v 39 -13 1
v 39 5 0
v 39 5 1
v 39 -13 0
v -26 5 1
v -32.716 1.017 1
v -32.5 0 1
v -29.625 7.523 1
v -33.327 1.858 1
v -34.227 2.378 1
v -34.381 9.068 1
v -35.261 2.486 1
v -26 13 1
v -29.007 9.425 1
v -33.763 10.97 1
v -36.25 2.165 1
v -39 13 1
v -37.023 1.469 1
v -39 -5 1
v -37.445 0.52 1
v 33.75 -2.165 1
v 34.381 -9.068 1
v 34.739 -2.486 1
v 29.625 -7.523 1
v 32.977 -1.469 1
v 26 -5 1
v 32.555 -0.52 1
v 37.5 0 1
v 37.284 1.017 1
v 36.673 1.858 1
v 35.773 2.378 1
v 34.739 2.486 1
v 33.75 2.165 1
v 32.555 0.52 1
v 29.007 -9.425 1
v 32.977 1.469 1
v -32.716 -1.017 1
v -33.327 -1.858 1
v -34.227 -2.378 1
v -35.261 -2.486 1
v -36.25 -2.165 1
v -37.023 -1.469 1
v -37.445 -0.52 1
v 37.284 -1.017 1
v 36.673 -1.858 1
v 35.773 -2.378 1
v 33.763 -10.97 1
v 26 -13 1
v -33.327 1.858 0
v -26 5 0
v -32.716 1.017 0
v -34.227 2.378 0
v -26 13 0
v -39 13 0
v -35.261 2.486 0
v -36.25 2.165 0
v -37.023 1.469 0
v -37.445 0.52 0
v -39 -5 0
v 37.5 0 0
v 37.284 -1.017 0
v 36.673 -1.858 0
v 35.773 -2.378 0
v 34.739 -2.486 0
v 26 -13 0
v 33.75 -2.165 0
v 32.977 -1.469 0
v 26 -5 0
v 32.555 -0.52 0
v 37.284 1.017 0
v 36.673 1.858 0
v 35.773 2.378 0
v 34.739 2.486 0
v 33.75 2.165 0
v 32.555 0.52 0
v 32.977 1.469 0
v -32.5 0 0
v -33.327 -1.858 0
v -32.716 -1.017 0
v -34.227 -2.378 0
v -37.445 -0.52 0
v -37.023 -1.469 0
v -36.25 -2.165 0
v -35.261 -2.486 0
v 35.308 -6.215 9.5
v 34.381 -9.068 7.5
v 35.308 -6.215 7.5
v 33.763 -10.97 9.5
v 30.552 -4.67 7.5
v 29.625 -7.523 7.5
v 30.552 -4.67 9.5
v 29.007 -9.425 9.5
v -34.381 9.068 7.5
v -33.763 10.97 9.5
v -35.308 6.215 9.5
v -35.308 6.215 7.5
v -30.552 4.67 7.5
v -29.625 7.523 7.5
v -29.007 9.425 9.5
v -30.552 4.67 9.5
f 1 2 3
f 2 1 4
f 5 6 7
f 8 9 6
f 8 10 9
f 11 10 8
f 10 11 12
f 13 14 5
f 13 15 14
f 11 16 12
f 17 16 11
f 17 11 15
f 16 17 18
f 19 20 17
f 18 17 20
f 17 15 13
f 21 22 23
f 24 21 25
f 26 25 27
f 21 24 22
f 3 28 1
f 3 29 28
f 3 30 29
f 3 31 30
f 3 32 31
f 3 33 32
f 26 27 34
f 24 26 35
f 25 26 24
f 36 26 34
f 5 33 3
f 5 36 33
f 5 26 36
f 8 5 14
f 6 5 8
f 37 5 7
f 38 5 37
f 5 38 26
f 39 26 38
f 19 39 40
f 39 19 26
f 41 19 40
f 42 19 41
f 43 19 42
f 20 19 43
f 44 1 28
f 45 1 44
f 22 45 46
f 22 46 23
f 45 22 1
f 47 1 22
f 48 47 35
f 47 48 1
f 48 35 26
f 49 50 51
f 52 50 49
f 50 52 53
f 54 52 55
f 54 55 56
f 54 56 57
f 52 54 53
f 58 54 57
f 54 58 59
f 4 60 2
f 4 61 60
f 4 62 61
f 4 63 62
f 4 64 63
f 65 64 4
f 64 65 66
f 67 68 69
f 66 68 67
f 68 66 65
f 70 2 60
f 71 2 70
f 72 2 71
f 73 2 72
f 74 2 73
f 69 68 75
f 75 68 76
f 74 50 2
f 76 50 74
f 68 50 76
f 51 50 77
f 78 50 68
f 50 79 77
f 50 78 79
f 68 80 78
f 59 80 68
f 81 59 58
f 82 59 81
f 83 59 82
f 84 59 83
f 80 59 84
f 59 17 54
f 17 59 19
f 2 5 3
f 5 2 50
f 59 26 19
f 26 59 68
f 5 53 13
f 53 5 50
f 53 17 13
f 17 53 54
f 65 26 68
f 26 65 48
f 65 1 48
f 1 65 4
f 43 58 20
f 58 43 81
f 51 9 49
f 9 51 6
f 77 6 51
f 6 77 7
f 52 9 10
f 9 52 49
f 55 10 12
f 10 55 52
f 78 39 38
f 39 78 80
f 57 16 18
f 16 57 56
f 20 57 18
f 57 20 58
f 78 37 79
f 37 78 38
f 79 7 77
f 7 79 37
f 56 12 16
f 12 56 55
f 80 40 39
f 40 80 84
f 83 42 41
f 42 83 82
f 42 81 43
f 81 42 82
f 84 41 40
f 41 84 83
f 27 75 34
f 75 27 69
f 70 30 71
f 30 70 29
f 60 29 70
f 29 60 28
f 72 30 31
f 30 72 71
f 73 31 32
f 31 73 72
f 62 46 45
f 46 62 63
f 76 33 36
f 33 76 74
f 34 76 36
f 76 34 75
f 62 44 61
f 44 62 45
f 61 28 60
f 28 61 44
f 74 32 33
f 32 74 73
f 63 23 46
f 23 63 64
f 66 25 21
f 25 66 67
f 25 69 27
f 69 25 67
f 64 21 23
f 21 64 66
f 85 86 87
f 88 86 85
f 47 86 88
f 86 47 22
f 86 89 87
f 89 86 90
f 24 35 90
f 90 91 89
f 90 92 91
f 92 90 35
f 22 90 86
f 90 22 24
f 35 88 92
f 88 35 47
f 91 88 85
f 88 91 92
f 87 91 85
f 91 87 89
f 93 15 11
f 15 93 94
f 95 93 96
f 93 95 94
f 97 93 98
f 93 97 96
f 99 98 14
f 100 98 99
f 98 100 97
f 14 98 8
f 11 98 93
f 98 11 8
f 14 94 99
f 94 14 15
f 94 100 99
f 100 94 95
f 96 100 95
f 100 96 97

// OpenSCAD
/*
 * Created by:
 * Thomas Buck <xythobuz@xythobuz.de> in May 2016
 *
 * Licensed under the Creative Commons - Attribution license.
 */

// -----------------------------------------------------------

hole_distance = 70;
hole_size = 5;

hook_width = 5;
hook_length = 5;
hook_height = 6.5;
hook_strength = 2;
hook_outer_distance = 71;
hook_angle = 18;

base_width = 78;
base_depth = 10;
base_height = 1;

$fn = 15;

// -----------------------------------------------------------

module hook() {
    cube([hook_width, hook_strength, hook_height]);
    translate([0, 0, hook_height])
        cube([hook_width, hook_length, hook_strength]);
}

module hooks() {
    translate([(hook_outer_distance / 2) - hook_width, 0, 0])
        hook();

    translate([-(hook_outer_distance / 2) + hook_width, 0, 0])
        rotate([0, 0, 180])
        hook();
}

module base() {
    difference() {
        union() {
            cube([base_width, base_depth, base_height]);
        
            translate([0, base_depth, 0])
                cube([13, 8, base_height]);
        
            translate([base_width - 13, -base_depth + 2, 0])
                cube([13, 8, base_height]);
        }
        
        translate([(base_width - hole_distance) / 2, base_depth / 2, -1])
            cylinder(d = hole_size, h = base_height + 2);
        
        translate([(base_width + hole_distance) / 2, base_depth / 2, -1])
            cylinder(d = hole_size, h = base_height + 2);
    }
}

// -----------------------------------------------------------

translate([-base_width / 2, -base_depth / 2, 0])
    base();

translate([0, 0, base_height])
    rotate([0, 0, -hook_angle])
    hooks();
